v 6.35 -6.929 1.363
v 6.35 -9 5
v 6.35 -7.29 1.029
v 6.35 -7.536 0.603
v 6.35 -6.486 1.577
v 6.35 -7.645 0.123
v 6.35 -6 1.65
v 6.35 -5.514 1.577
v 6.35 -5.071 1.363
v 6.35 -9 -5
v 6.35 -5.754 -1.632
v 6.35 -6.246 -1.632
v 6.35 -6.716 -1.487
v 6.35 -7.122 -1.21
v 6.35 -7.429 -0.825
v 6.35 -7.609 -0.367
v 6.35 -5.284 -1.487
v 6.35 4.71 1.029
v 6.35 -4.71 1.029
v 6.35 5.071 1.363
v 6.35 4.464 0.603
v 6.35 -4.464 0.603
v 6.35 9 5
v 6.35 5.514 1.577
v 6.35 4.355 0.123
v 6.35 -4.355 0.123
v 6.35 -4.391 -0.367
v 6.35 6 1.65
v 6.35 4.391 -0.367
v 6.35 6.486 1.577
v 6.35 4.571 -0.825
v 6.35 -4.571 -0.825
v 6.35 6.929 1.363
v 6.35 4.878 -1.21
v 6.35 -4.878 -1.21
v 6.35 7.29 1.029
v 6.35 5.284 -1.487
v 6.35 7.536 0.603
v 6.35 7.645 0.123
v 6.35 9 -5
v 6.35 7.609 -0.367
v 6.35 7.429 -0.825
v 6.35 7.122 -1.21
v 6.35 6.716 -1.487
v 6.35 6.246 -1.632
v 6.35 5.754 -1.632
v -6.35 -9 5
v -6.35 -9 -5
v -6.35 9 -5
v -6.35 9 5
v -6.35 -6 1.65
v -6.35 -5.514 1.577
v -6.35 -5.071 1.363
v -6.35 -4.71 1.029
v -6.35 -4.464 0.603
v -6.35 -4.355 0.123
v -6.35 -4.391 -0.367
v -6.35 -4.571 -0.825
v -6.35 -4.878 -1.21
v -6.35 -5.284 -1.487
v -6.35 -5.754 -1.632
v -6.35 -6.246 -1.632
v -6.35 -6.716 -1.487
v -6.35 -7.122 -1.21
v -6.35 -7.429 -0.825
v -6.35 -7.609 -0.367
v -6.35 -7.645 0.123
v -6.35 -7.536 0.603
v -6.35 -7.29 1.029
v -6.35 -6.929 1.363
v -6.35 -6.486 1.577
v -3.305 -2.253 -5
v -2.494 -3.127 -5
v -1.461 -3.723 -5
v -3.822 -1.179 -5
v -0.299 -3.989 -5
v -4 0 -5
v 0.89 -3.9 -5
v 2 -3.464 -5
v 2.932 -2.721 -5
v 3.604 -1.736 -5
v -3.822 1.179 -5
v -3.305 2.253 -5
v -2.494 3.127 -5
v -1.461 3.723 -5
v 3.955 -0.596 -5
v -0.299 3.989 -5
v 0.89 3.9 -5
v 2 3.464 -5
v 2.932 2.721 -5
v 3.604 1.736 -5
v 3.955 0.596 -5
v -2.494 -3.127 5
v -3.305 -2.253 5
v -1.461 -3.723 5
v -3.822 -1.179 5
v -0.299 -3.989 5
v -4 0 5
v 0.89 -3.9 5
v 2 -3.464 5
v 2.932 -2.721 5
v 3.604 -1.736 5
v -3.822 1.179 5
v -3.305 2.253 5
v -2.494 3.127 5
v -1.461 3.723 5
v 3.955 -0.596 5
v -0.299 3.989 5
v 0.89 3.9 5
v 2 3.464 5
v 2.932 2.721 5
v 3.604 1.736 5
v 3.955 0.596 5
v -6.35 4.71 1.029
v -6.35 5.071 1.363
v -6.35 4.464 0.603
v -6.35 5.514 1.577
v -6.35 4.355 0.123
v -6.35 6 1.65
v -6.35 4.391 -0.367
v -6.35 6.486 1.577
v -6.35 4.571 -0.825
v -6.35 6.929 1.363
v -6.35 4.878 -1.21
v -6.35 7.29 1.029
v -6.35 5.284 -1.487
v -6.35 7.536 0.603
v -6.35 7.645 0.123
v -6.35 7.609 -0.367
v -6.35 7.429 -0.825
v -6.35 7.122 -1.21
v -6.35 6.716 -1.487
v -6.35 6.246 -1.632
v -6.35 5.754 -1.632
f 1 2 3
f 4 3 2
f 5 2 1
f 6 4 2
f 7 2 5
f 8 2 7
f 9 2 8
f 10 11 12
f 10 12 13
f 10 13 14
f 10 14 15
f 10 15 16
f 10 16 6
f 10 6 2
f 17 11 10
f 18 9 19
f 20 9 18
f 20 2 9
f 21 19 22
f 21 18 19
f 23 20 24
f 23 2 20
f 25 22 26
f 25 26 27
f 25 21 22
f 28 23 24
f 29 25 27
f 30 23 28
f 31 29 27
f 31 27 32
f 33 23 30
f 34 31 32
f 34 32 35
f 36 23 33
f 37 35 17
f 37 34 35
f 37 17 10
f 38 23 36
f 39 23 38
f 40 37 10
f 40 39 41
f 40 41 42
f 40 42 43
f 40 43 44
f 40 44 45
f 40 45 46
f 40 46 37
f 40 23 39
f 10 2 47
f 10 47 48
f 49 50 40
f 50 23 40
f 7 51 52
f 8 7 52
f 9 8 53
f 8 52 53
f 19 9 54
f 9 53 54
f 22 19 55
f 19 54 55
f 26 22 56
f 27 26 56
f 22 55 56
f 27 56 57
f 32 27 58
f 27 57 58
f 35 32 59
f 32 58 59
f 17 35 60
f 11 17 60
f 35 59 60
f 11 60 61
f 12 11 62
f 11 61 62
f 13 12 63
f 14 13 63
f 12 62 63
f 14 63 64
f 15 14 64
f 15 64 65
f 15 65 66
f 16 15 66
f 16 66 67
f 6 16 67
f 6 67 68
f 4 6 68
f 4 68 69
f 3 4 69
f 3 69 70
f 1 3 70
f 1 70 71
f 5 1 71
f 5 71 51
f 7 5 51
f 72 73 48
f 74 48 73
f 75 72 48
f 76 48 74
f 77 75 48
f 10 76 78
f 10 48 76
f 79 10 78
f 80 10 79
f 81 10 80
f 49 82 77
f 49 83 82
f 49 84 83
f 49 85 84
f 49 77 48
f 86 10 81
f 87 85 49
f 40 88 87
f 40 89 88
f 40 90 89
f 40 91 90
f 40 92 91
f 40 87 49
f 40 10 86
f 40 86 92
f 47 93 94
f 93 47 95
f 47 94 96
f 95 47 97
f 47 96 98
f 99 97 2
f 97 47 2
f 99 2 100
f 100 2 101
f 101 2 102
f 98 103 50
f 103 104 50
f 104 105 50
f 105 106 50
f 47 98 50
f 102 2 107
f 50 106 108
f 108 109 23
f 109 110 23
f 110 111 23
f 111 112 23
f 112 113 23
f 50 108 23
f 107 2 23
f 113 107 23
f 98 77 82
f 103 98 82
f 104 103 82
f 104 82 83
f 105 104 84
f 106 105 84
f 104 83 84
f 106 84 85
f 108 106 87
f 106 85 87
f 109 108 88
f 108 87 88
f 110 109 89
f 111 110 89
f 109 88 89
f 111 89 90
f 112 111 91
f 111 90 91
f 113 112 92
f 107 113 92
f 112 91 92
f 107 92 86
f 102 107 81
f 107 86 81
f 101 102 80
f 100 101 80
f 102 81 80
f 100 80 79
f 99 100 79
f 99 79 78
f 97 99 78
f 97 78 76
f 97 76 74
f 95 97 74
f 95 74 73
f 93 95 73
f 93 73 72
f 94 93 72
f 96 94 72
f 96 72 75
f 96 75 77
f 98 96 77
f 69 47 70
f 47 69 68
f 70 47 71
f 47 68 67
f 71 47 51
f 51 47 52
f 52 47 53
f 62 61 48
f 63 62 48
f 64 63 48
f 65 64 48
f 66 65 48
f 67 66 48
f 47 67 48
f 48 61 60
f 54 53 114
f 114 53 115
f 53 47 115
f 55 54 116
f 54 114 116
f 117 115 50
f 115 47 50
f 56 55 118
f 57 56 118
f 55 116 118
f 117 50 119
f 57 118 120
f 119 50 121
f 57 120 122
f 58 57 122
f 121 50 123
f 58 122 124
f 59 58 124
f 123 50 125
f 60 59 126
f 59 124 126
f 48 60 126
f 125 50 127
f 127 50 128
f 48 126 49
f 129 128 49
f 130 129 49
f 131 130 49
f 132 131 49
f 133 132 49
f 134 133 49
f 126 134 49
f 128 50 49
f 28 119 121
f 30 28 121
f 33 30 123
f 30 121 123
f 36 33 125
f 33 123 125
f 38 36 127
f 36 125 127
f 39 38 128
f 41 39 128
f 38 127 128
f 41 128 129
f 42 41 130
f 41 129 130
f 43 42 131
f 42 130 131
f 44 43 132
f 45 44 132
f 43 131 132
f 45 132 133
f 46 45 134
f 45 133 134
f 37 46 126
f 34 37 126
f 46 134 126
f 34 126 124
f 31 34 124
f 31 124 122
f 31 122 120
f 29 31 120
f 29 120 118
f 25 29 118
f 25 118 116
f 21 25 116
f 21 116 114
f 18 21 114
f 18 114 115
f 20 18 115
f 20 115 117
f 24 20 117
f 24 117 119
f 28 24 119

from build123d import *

# Parameters (mm, degrees)
CROQUIS1_W                    = 10
CROQUIS1_H                    = 18
SALIENTE_EXTRUIR1_DEPTH       = 6.35
TALADRO_ROSCADO_M4X0_71_D     = 3.3
DI_METRO_DE_TALADRO_5_0_5_1_D = 8


with BuildPart() as part:
    # Croquis1 → Saliente-Extruir1 (new, symmetric)
    with BuildSketch(Plane(origin=(0, 0, 0), x_dir=(0, 0, -1), z_dir=(1, 0, 0))):
        Rectangle(CROQUIS1_W, CROQUIS1_H)
    extrude(amount=SALIENTE_EXTRUIR1_DEPTH, both=True)

    # Taladro roscado M4x0.71 (through all)
    with Locations(Plane(origin=(6.35, 0, 0), x_dir=(0, 0, -1), z_dir=(1, 0, 0))):
        with Locations((0, 6), (0, -6)):
            Hole(TALADRO_ROSCADO_M4X0_71_D / 2)

    # Diámetro de taladro Ø5.0 (5)1 (through all)
    with Locations(Plane.XY.offset(5)):
        with Locations((0, 0)):
            Hole(DI_METRO_DE_TALADRO_5_0_5_1_D / 2)


solid = part.part
